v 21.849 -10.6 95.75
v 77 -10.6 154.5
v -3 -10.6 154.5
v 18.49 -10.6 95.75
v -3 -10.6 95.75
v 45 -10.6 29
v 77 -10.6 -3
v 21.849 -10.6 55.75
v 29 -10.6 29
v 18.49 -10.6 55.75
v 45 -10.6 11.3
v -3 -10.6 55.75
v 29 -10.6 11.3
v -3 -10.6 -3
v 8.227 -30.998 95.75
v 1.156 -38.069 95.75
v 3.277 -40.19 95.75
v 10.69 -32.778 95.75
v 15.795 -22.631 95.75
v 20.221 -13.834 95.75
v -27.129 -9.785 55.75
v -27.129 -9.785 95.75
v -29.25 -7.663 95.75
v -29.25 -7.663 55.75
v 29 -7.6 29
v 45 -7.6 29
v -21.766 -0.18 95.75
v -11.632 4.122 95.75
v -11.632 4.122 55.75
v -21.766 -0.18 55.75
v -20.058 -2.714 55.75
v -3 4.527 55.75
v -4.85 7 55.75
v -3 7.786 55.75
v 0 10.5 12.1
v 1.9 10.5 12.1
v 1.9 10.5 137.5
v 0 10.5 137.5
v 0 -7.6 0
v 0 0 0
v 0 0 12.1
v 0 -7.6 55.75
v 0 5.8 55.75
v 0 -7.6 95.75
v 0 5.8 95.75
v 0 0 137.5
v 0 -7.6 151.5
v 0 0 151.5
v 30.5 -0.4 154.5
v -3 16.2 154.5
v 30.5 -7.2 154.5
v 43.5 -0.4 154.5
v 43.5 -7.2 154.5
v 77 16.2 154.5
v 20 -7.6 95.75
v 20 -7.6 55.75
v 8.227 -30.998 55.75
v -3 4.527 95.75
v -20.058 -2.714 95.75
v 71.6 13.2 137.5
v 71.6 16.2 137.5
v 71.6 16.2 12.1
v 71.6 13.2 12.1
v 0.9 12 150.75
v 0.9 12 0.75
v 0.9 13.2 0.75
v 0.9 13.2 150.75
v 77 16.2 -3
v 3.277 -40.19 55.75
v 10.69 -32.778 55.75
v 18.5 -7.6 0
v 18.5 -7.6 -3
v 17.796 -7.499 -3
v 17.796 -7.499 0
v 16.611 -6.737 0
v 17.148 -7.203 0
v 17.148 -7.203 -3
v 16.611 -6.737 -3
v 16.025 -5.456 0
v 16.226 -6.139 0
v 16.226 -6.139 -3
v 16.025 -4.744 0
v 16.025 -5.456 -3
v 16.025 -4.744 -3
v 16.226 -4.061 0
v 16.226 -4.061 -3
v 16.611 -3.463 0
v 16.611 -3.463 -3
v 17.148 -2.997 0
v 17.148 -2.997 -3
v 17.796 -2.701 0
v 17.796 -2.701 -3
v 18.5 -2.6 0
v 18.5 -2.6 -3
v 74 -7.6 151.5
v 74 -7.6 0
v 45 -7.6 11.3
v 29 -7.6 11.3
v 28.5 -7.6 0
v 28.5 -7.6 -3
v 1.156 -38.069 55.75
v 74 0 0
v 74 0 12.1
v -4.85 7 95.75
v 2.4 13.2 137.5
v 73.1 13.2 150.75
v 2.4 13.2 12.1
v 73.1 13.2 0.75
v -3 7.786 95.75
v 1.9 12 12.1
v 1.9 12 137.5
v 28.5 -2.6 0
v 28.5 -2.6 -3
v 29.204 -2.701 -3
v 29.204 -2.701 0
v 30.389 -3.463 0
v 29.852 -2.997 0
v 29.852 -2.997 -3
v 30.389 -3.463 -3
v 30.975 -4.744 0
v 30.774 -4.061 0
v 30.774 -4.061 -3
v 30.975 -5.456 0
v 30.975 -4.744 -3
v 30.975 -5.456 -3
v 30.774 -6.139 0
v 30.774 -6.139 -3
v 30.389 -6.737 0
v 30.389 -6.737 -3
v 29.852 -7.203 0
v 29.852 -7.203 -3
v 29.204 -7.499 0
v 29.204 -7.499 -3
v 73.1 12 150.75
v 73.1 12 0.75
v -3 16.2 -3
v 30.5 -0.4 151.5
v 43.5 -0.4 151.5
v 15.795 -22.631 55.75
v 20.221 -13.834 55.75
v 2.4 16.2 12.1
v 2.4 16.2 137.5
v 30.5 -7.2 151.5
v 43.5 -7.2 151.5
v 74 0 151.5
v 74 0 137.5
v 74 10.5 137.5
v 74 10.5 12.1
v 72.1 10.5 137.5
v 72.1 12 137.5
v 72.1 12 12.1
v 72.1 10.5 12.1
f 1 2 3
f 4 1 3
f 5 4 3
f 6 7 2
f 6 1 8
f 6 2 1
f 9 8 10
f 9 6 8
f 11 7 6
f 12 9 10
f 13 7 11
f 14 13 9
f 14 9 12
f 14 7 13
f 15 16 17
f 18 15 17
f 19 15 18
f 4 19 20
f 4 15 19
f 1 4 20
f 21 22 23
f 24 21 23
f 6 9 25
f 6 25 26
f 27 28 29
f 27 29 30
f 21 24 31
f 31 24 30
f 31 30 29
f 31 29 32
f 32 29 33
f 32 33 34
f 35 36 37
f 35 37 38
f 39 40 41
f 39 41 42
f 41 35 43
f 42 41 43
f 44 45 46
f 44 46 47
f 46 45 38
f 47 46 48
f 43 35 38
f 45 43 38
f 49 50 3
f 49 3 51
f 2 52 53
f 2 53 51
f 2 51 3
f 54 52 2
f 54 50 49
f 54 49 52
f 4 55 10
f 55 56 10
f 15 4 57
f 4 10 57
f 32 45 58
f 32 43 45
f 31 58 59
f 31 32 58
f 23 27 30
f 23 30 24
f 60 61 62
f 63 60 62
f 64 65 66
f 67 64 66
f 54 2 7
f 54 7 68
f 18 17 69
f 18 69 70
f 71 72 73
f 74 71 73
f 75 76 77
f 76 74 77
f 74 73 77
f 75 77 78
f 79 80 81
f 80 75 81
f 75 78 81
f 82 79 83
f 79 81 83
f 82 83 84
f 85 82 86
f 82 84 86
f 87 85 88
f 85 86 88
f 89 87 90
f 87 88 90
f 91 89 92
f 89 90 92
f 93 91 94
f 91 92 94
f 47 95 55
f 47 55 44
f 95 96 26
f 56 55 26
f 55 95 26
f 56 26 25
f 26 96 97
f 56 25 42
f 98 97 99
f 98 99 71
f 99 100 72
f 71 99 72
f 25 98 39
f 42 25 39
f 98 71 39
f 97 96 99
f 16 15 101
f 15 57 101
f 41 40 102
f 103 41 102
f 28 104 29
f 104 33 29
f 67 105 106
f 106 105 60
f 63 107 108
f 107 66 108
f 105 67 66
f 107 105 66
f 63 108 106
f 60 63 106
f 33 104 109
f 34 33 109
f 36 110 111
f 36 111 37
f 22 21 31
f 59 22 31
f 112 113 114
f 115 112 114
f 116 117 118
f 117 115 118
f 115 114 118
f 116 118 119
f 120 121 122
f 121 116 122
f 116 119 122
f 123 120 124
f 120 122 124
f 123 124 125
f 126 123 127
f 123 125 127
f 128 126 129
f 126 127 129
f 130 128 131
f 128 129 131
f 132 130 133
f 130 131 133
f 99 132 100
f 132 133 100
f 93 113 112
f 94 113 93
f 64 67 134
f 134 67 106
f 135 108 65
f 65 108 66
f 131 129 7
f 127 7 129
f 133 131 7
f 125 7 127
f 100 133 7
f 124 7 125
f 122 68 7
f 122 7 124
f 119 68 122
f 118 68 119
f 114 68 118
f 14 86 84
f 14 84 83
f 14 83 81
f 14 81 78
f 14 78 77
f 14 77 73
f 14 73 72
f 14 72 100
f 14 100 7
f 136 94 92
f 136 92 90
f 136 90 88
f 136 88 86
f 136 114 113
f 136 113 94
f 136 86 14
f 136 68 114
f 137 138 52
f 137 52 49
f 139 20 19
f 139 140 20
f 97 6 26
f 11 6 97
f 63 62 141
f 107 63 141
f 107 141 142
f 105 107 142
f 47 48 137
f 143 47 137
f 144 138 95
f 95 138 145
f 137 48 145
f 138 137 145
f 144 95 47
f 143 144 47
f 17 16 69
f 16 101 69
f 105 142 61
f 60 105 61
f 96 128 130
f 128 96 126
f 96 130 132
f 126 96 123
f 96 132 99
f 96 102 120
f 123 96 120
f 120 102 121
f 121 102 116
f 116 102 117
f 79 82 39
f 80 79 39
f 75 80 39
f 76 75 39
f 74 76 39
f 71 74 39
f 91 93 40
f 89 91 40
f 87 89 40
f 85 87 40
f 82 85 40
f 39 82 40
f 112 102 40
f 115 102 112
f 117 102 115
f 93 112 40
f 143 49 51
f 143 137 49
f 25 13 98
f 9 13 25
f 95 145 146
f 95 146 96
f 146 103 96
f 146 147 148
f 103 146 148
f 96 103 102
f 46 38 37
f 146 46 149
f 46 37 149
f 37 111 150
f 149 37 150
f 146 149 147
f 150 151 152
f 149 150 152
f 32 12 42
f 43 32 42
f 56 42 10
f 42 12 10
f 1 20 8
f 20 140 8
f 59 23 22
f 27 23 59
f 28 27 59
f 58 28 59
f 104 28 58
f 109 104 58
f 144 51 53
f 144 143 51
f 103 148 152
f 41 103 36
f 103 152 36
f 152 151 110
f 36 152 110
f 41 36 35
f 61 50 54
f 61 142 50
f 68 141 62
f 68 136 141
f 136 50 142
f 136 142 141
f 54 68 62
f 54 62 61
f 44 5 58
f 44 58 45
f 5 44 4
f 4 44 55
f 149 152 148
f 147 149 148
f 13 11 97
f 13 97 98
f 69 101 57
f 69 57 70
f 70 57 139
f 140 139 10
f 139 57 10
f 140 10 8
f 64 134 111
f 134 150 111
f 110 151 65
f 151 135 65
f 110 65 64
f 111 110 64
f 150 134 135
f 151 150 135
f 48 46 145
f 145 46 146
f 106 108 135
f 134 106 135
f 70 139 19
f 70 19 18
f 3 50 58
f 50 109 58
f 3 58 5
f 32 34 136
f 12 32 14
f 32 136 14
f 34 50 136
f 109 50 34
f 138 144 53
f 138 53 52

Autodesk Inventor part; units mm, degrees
ref_plane "YZ Plane" through (0, 0, 0) normal (1, 0, 0) x (0, 1, 0)
ref_plane "XZ Plane" through (0, 0, 0) normal (0, 1, 0) x (-1, 0, 0)
ref_plane "XY Plane" through (0, 0, 0) normal (0, 0, 1) x (1, 0, 0)
sketch "Sketch1" plane through (0, 0, 0) normal (0, 0, 1) x (1, 0, 0)
  line L0 (0, 0) -> (74, 0)
  line L1 (74, 0) -> (74, -7.6)
  line L2 (74, -7.6) -> (0, -7.6)
  line L3 (0, -7.6) -> (0, 0)
  line L4 (0.9, 13.2) -> (73.1, 13.2)
  line L5 (73.1, 13.2) -> (73.1, 12)
  line L6 (73.1, 12) -> (0.9, 12)
  line L7 (0.9, 12) -> (0.9, 13.2)
  line L8 (-3, 16.2) -> (77, 16.2)
  line L9 (77, 16.2) -> (77, -10.6)
  line L10 (77, -10.6) -> (-3, -10.6)
  line L11 (-3, -10.6) -> (-3, 16.2)
  dimension "d0" = 74
  dimension "d1" = 7.6
  dimension "d2" = 1.2
  dimension "d3" = 12
  dimension "d4" = 72.2
  dimension "d5" = 0.9
  dimension "d6" = 3
  dimension "d7" = 3
  dimension "d8" = 3
  dimension "d9" = 3
extrude "Extrusion1" add sketch "Sketch1" along normal blind 151.5
sketch "Sketch2" plane through (-3, 16.2, 0) normal (0, 1, 0) x (1, 0, 0)
  line L0 (77, -12.1) -> (3, -12.1)
  line L1 (3, -12.1) -> (3, -137.5)
  line L2 (3, -137.5) -> (77, -137.5)
  line L3 (77, -137.5) -> (77, -12.1)
  line L4 (80, 0) -> (80, -151.5) projected
  line L5 (0, 0) -> (0, -151.5) projected
  line L6 (80, 0) -> (0, 0) projected
  line L7 (80, -151.5) -> (0, -151.5) projected
  point P0 (3, 0)
  dimension "d12" = 3
  dimension "d14" = 12.1
  dimension "d15" = 14
  dimension "d23" = 3
extrude "Extrusion2" cut sketch "Sketch2" against normal up to surface (23.8 mm away) contours L3 L2 L1 L0
sketch "Sketch3" plane through (-3, 16.2, 0) normal (0, 1, 0) x (1, 0, 0)
  line L0 (80, 0) -> (80, -151.5) projected
  line L1 (0, 0) -> (0, -151.5) projected
  line L2 (80, -0.75) -> (0, -0.75)
  line L3 (0, -0.75) -> (0, -150.75)
  line L4 (0, -150.75) -> (80, -150.75)
  line L5 (80, -150.75) -> (80, -0.75)
  line L6 (80, -151.5) -> (0, -151.5) projected
  line L7 (80, 0) -> (0, 0) projected
  line L8 (80, 0) -> (0, 0)
  line L9 (0, 0) -> (0, -151.5)
  line L10 (0, -151.5) -> (80, -151.5)
  line L11 (80, -151.5) -> (80, 0)
  point P0 (3, 0)
  point P1 (0, -0.75)
  dimension "d18" = 150
  dimension "d19" = 151.5
  dimension "d20" = 0.75
extrude "Extrusion3" add sketch "Sketch3" against normal up to surface (4.2 mm away) contours L0 L2 L1 L7 | L0 L6 L1 L4
sketch "Sketch4" plane through (0, 0, 0) normal (0, 0, -1) x (-1, 0, 0)
  line L0 (-77, -10.6) -> (-77, 16.2) projected
  line L1 (3, 16.2) -> (3, -10.6) projected
  line L2 (-77, -10.6) -> (3, -10.6)
  line L3 (3, -10.6) -> (3, 16.2)
  line L4 (3, 16.2) -> (-77, 16.2)
  line L5 (-77, 16.2) -> (-77, -10.6)
  point P0 (0, 0)
extrude "Extrusion4" add sketch "Sketch4" along normal blind 3
sketch "Sketch5" plane through (0, 0, 151.5) normal (0, 0, 1) x (1, 0, 0)
  line L0 (-3, 16.2) -> (77, 16.2) projected
  line L1 (77, -10.6) -> (-3, -10.6) projected
  line L2 (77, 16.2) -> (-3, 16.2)
  line L3 (-3, 16.2) -> (-3, -10.6)
  line L4 (-3, -10.6) -> (77, -10.6)
  line L5 (77, -10.6) -> (77, 16.2)
  line L6 (43.5, -0.4) -> (30.5, -0.4)
  line L7 (30.5, -0.4) -> (30.5, -7.2)
  line L8 (30.5, -7.2) -> (43.5, -7.2)
  line L9 (43.5, -7.2) -> (43.5, -0.4)
  line L10 (74, -7.6) -> (0, -7.6) projected
  line L11 (74, 0) -> (74, -7.6) projected
  point P0 (0, 0)
  dimension "d26" = 6.8
  dimension "d27" = 13
  dimension "d28" = 0.4
  dimension "d29" = 30.5
extrude "Extrusion5" add sketch "Sketch5" along normal blind 3
sketch "Sketch6" plane through (-3, -10.6, -3) normal (0, -1, 0) x (1, 0, 0)
  line L0 (48, 14.3) -> (32, 14.3)
  line L1 (32, 14.3) -> (32, 32)
  line L2 (32, 32) -> (48, 32)
  line L3 (48, 32) -> (48, 14.3)
  line L4 (77, 3) -> (3, 3) projected
  line L5 (80, 157.5) -> (80, 0) projected
  dimension "d32" = 11.3
  dimension "d33" = 16
  dimension "d34" = 17.7
  dimension "d35" = 32
extrude "Extrusion6" cut sketch "Sketch6" against normal up to surface (3 mm away)
sketch "Sketch7" plane through (-3, 16.2, -3) normal (0, 1, 0) x (1, 0, 0)
  line L0 (3, -15.1) -> (77, -15.1) projected
  line L1 (77, -140.5) -> (3, -140.5) projected
  line L2 (74.6, -15.1) -> (5.4, -15.1)
  line L3 (5.4, -15.1) -> (5.4, -140.5)
  line L4 (5.4, -140.5) -> (74.6, -140.5)
  line L5 (74.6, -140.5) -> (74.6, -15.1)
  line L6 (77, -15.1) -> (77, -140.5) projected
  line L7 (3, -140.5) -> (3, -15.1) projected
  line L8 (77, -3) -> (77, -15.1) projected
  line L9 (77, -15.1) -> (3, -15.1)
  line L10 (3, -15.1) -> (3, -140.5)
  line L11 (3, -140.5) -> (77, -140.5)
  line L12 (77, -140.5) -> (77, -15.1)
  point P0 (3, -3)
  point P1 (5.4, -15.1)
  dimension "d38" = 2.4
  dimension "d39" = 2.4
extrude "Extrusion7" add sketch "Sketch7" against normal up to surface (3 mm away) contours L0 L3 L1 L7 | L0 L6 L1 L5
sketch "Sketch8" plane through (0, 0, -3) normal (0, 0, -1) x (-1, 0, 0)
  line L0 (-74, -7.6) -> (0, -7.6) projected
  line L1 (-18.5, -7.6) -> (-28.5, -7.6)
  line L2 (-31, -5.1) -> (-31, -5.1)
  line L3 (-28.5, -2.6) -> (-18.5, -2.6)
  line L4 (-16, -5.1) -> (-16, -5.1)
  line L5 (0, -7.6) -> (0, 0) projected
  line L6 (0, 0) -> (-74, 0) projected
  arc A0 (-31, -5.1) -> (-28.5, -7.6) centre (-28.5, -5.1) ccw
  arc A1 (-28.5, -2.6) -> (-31, -5.1) centre (-28.5, -5.1) ccw
  arc A2 (-18.5, -7.6) -> (-16, -5.1) centre (-18.5, -5.1) ccw
  arc A3 (-16, -5.1) -> (-18.5, -2.6) centre (-18.5, -5.1) ccw
  point P0 (-16, -7.6)
  point P1 (-31, -2.6)
  point P2 (-31, -7.6)
  point P3 (-16, -2.6)
  dimension "d42" = 15
  dimension "d43" = 16
  dimension "d44" = 2.6
  dimension "d45" = 5
  dimension "d46" = 2.5
extrude "Extrusion8" cut sketch "Sketch8" against normal up to surface (3 mm away)
sketch "Sketch9" plane through (0, 0, 12.1) normal (0, 0, 1) x (1, 0, 0)
  line L0 (0.9, 12) -> (0.9, 13.2) projected
  line L1 (0.9, 12) -> (0, 12)
  line L2 (0, 13.2) -> (0, 0) projected
  line L3 (0, 12) -> (1.9, 12)
  line L4 (1.9, 12) -> (1.9, 10.5)
  line L5 (1.9, 10.5) -> (0, 10.5)
  line L6 (0, 10.5) -> (0, 12)
  line L7 (0.9, 13.2) -> (0, 13.2)
  line L8 (0, 13.2) -> (0, 12)
  line L9 (0, 12) -> (0.9, 12)
  line L10 (0.9, 12) -> (0.9, 13.2)
  line L11 (73.1, 12) -> (73.1, 13.2) projected
  line L12 (73.1, 12) -> (74, 12)
  line L13 (74, 13.2) -> (74, 0) projected
  line L14 (74, 12) -> (72.1, 12)
  line L15 (72.1, 12) -> (72.1, 10.5)
  line L16 (72.1, 10.5) -> (74, 10.5)
  line L17 (74, 10.5) -> (74, 12)
  line L18 (74, 13.2) -> (73.1, 13.2) projected
  line L19 (73.1, 12) -> (74, 12)
  line L20 (74, 12) -> (74, 13.2)
  line L21 (74, 13.2) -> (73.1, 13.2)
  line L22 (73.1, 13.2) -> (73.1, 12)
  point P0 (0, 10.5)
  point P1 (73.1, 12)
  dimension "d49" = 1
  dimension "d50" = 1.5
  dimension "d52" = 1.5
  dimension "d53" = 1
extrude "Extrusion9" add sketch "Sketch9" along normal up to surface (125.4 mm away)
sketch "Sketch10" plane through (-3, -10.6, -3) normal (0, -1, 0) x (1, 0, 0)
  line L0 (20, 98.75) -> (-20, 98.75)
  line L1 (-20, 98.75) -> (-20, 58.75)
  line L2 (-20, 58.75) -> (20, 58.75)
  line L3 (20, 58.75) -> (20, 98.75)
  line L4 (80, 0) -> (0, 0) projected
  line L5 (0, 0) -> (0, 157.5) projected
  point P0 (3, 3)
  dimension "d56" = 40
  dimension "d57" = 40
  dimension "d58" = 58.75
  dimension "d59" = 20
extrude "Extrusion10" cut sketch "Sketch10" against normal blind 13.4
chamfer "Chamfer1" distance 3 angle 45 1 edges at (17, -7.6, 75.75)
sketch "Sketch12" plane through (-3, -10.6, 55.75) normal (0, 0, 1) x (1, 0, 0)
  line L0 (-17.0576, 7.8863) -> (11.2267, -20.3979)
  line L1 (11.2267, -20.3979) -> (4.1557, -27.469)
  line L2 (4.1557, -27.469) -> (-24.1286, 0.8153)
  line L3 (-24.1286, 0.8153) -> (-17.0576, 7.8863)
  line L4 (80, 0) -> (0, 0) projected
  line L5 (0, 13.4) -> (3, 16.4) projected
  line L6 (3, 16.4) -> (-17.0576, 7.8863)
  line L7 (23, 3) -> (20, 0) projected
  line L8 (23, 3) -> (11.2267, -20.3979)
  line L9 (23, 3) -> (3, 16.4)
  point P0 (3, 10.6)
  point P1 (21.4905, 0)
  dimension "d65" = 90
  dimension "d66" = 90
  dimension "d67" = 45
  dimension "d68" = 10
  dimension "d69" = 40
extrude "Extrusion11" cut sketch "Sketch12" along normal up to surface (40 mm away) contours L6 L9 L7 L4 L8 L0 | L4 L7 L8
sketch "Sketch13" plane through (-3, -10.6, 55.75) normal (0, 0, 1) x (1, 0, 0)
  line L0 (-17.0576, 7.8863) -> (11.2267, -20.3979)
  line L1 (11.2267, -20.3979) -> (4.1557, -27.469)
  line L2 (4.1557, -27.469) -> (-24.1286, 0.8153)
  line L3 (-24.1286, 0.8153) -> (-17.0576, 7.8863)
  line L4 (3, 16.4) -> (-17.0576, 7.8863)
  line L5 (23, 3) -> (11.2267, -20.3979)
  line L6 (23, 3) -> (3, 16.4) construction
  line L7 (-18.1567, 11.0298) -> (-26.2499, 2.9366)
  line L8 (-28.3713, 0.8153) -> (4.1557, -31.7116) construction
  line L9 (6.277, -29.5903) -> (18.682, -17.1853)
  line L10 (-24.1286, 0.8153) -> (-26.2499, 2.9366)
  line L11 (-26.2499, 2.9366) -> (6.277, -29.5903)
  line L12 (-1.8502, 17.6004) -> (-8.6324, 14.7216)
  line L13 (-1.8502, 17.6004) -> (-22.9463, 8.6459)
  line L14 (-9.9896, 14.1455) -> (3.638, 19.9299)
  line L15 (0, 0) -> (0, 26.8) projected
  line L16 (0, 15.1266) -> (0, 18.3857)
  line L17 (0, 0) -> (0, 15.1266) projected
  line L18 (23.2213, -3.2345) -> (18.7952, -12.0308)
  line L19 (23.2213, -3.2345) -> (9.1734, -31.1531)
  line L20 (17.9281, -13.7542) -> (27.2379, 4.7479)
  line L21 (80, 0) -> (0, 0) projected
  line L22 (24.8488, 0) -> (21.4905, 0)
  point P0 (3, 10.6)
  point P1 (4, 11.6)
  point P2 (0, 18.3857)
  point P3 (-8.6324, 14.7216)
  point P4 (-18.7665, 10.42)
  point P5 (13.6895, -22.1778)
  point P6 (23.2213, -3.2345)
  dimension "d72" = 90
  dimension "d73" = 90
  dimension "d74" = 10
  dimension "d75" = 40
  dimension "d76" = 3
  dimension "d77" = 3
  dimension "d78" = 3
  dimension "d79" = 3
  dimension "d80" = 3
extrude "Extrusion12" add sketch "Sketch13" along normal up to surface (40 mm away) contours L3 L10 L7 L13 L12 L14 L15 L4 | L5 L21 L20 L18 L19 L9 L11 L1
properties part number "left"
